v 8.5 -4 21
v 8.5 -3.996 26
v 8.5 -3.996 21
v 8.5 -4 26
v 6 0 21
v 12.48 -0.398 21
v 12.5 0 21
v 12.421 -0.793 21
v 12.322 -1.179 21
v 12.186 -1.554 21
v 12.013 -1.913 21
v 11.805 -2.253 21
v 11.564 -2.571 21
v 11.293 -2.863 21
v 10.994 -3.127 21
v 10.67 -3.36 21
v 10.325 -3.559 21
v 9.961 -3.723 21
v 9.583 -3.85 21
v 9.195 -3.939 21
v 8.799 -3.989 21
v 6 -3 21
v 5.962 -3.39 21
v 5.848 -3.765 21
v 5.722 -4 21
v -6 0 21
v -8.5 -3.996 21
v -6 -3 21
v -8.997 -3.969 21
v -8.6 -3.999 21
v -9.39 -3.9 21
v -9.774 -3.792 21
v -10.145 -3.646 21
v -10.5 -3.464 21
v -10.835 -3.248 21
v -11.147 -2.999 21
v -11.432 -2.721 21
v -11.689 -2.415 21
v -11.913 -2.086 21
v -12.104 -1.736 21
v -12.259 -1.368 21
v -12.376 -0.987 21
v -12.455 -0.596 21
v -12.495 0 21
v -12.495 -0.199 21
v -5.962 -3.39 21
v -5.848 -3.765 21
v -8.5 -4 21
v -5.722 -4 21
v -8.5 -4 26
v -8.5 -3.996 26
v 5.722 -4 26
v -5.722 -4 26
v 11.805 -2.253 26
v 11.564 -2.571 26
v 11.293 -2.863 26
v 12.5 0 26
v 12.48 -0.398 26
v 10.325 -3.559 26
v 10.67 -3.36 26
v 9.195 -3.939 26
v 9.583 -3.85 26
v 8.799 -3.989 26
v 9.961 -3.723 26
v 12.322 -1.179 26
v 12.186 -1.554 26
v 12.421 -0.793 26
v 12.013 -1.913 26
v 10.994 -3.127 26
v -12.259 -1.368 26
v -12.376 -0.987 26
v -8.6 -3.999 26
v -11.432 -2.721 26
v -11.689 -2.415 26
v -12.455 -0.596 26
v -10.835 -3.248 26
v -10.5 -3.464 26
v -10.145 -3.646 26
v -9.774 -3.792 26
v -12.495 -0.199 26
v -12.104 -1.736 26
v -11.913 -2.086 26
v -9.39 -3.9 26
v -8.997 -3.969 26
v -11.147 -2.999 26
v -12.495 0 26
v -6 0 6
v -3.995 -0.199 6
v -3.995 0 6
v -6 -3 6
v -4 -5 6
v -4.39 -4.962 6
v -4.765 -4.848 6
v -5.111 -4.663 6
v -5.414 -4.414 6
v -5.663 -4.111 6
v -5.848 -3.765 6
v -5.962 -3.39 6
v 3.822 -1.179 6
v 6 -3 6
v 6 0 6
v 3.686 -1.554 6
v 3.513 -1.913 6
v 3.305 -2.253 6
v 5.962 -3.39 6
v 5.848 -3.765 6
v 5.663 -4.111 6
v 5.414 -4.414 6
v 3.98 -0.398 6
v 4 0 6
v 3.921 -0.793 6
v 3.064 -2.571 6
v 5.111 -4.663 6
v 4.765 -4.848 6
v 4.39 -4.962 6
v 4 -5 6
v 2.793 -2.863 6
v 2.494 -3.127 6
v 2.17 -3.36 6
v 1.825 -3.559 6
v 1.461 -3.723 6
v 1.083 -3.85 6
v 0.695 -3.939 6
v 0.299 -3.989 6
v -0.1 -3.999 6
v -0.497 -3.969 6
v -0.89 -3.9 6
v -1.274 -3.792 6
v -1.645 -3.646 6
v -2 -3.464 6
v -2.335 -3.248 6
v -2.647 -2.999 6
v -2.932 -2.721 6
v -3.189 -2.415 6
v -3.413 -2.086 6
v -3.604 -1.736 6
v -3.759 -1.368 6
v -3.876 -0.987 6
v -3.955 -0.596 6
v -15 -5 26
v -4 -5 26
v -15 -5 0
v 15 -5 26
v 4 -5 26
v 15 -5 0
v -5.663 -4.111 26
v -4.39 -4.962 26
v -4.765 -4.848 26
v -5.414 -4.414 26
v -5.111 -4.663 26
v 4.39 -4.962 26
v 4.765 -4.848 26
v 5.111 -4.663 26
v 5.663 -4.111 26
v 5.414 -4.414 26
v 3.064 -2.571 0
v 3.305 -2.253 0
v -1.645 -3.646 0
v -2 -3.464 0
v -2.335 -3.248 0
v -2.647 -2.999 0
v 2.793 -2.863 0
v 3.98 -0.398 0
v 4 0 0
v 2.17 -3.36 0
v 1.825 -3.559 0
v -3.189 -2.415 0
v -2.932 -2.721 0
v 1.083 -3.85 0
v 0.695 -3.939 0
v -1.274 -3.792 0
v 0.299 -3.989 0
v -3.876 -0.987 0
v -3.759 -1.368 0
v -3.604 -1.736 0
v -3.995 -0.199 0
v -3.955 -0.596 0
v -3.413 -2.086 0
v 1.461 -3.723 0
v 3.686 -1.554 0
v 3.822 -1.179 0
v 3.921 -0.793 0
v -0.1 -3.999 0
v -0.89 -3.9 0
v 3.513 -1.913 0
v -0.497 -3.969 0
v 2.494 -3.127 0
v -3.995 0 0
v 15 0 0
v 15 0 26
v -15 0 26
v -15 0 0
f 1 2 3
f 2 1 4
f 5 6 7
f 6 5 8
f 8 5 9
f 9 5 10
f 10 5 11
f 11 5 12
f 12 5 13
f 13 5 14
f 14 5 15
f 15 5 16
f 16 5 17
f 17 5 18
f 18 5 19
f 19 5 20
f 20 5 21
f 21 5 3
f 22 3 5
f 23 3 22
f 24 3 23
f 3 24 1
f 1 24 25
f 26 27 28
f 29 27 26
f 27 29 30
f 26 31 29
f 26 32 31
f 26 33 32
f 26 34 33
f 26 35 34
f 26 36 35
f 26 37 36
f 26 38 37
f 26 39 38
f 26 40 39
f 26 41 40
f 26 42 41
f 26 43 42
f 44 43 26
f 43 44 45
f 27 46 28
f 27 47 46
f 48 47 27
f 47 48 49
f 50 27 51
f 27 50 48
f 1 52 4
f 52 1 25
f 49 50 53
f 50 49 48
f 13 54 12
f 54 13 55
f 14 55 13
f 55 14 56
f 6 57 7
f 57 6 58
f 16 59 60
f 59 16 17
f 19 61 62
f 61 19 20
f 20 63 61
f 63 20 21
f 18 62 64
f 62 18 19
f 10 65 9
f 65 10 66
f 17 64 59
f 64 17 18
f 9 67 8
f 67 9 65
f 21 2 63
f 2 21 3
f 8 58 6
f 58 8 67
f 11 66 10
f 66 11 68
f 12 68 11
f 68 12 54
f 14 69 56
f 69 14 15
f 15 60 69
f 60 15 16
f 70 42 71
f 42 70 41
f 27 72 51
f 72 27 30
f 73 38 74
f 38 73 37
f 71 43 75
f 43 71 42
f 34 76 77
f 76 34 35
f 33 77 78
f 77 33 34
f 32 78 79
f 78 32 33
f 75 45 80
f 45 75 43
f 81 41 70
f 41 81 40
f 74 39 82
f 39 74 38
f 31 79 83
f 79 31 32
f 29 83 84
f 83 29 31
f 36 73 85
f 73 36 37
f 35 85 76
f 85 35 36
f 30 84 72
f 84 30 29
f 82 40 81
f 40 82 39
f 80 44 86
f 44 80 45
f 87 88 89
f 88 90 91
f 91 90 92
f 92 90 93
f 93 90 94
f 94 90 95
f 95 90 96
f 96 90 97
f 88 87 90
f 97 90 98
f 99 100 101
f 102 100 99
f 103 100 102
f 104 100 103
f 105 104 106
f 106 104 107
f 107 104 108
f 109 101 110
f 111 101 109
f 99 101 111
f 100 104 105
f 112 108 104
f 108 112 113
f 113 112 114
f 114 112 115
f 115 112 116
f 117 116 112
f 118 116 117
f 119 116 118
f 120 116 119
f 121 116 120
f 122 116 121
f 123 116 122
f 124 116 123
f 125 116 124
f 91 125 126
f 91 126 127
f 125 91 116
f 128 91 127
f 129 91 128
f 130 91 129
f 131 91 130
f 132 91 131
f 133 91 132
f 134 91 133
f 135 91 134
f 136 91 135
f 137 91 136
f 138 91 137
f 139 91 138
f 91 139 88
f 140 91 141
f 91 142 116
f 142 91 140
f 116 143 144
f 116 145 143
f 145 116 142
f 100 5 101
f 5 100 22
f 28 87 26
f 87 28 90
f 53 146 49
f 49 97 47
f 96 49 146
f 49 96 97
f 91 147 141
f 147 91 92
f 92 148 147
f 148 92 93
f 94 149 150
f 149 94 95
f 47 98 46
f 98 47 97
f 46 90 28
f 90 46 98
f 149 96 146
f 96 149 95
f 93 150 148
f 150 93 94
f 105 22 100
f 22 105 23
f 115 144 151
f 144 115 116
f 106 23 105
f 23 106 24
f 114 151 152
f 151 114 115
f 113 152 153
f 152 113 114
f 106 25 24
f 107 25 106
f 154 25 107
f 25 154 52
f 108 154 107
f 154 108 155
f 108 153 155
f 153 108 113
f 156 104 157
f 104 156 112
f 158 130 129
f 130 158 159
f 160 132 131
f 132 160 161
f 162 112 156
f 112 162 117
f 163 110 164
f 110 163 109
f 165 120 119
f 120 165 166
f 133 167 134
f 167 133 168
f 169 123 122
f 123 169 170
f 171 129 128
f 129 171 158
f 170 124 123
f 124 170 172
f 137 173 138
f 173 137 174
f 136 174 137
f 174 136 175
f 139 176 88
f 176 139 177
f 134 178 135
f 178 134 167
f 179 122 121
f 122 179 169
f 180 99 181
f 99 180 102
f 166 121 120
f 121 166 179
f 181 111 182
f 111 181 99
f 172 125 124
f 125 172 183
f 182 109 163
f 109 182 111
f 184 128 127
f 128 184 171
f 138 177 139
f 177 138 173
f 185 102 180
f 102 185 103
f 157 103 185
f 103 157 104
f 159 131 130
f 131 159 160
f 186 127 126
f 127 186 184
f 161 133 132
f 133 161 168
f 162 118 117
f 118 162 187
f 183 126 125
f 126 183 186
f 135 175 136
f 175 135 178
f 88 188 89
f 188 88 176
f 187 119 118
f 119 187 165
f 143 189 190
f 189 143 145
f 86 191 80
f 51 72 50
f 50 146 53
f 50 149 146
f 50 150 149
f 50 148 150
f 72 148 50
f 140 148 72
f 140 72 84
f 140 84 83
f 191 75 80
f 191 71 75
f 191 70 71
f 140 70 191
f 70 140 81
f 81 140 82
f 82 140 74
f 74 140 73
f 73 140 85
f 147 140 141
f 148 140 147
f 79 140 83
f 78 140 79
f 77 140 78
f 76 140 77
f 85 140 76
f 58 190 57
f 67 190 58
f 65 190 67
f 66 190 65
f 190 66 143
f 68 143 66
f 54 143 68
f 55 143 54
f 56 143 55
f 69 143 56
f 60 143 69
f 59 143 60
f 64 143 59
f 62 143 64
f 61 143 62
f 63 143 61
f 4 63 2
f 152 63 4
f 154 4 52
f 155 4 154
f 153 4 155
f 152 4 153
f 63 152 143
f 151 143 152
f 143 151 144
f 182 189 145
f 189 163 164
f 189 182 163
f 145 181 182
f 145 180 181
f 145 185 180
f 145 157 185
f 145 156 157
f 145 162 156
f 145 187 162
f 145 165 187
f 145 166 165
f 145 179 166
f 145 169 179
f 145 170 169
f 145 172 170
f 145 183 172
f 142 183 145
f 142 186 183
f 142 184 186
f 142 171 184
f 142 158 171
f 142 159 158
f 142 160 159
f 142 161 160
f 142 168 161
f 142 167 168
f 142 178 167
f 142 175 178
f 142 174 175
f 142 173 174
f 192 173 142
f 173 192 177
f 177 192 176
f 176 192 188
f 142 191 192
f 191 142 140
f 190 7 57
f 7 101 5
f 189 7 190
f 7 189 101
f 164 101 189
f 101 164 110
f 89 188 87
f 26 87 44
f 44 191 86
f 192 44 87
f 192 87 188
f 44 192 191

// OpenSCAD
shell_size_x = 30;
shell_size_y = 10;
shell_size_z = 26;
strain_z = 7;
body_z = 19;
mount_z = 4;

height_overlap = 2;

module centered_rounded_cube(size, round_over)
{
    cube(size = [ size[0] - round_over * 2, size[1], size[2] ], center = true);
    cube(size = [ size[0], size[1] - round_over * 2, size[2] ], center = true);

    translate([ size[0] / 2 - round_over, size[1] / 2 - round_over, 0 ])
        cylinder(size[2], round_over, round_over, center = true);
    translate([ (size[0] / 2 - round_over) * -1, size[1] / 2 - round_over, 0 ])
        cylinder(size[2], round_over, round_over, center = true);
    translate([ (size[0] / 2 - round_over) * -1, (size[1] / 2 - round_over) * -1, 0 ])
        cylinder(size[2], round_over, round_over, center = true);
    translate([ size[0] / 2 - round_over, (size[1] / 2 - round_over) * -1, 0 ])
        cylinder(size[2], round_over, round_over, center = true);
}

module offset_rounded_cube(size, round_over)
{
    translate([ size[0] / 2, size[1] / 2, size[2] / 2 ]) centered_rounded_cube(size, round_over);
}

module shell()
{
    translate([ 0, 0, shell_size_z / 2 ]) cube(size = [ shell_size_x, shell_size_y, shell_size_z ], center = true);
}

module strain_relief()
{
    strain_r = 4;
    translate([ 0, 0, strain_z / 2 ]) cylinder(strain_z + height_overlap, strain_r, strain_r, center = true);
}

module body()
{
    body_x = 12;
    body_y = 10;
    body_round_radius = 2;

    translate([ 0, 0, body_z / 2 ]) centered_rounded_cube([ body_x, body_y, body_z + height_overlap ], 2);
}

module mount()
{
    mount_x = 25;
    mount_y = 8;

    translate([ 0, 0, mount_z / 2 ]) centered_rounded_cube([ mount_x, mount_y, mount_z + height_overlap ], 4);
}

module hole()
{
    translate([ 0, 0, strain_z + body_z - mount_z ]) mount();
    translate([ 0, 0, strain_z ]) body();
    translate([ 0, 0, 0 ]) strain_relief();
}

$fa = 1;
$fs = 0.4;
difference()
{
    difference()
    {
        shell();
        hole();
    }
    translate([ -shell_size_x / 2, 0, 0 ])
        cube([ shell_size_x + height_overlap, shell_size_y / 2, shell_size_z + height_overlap ]);
}
